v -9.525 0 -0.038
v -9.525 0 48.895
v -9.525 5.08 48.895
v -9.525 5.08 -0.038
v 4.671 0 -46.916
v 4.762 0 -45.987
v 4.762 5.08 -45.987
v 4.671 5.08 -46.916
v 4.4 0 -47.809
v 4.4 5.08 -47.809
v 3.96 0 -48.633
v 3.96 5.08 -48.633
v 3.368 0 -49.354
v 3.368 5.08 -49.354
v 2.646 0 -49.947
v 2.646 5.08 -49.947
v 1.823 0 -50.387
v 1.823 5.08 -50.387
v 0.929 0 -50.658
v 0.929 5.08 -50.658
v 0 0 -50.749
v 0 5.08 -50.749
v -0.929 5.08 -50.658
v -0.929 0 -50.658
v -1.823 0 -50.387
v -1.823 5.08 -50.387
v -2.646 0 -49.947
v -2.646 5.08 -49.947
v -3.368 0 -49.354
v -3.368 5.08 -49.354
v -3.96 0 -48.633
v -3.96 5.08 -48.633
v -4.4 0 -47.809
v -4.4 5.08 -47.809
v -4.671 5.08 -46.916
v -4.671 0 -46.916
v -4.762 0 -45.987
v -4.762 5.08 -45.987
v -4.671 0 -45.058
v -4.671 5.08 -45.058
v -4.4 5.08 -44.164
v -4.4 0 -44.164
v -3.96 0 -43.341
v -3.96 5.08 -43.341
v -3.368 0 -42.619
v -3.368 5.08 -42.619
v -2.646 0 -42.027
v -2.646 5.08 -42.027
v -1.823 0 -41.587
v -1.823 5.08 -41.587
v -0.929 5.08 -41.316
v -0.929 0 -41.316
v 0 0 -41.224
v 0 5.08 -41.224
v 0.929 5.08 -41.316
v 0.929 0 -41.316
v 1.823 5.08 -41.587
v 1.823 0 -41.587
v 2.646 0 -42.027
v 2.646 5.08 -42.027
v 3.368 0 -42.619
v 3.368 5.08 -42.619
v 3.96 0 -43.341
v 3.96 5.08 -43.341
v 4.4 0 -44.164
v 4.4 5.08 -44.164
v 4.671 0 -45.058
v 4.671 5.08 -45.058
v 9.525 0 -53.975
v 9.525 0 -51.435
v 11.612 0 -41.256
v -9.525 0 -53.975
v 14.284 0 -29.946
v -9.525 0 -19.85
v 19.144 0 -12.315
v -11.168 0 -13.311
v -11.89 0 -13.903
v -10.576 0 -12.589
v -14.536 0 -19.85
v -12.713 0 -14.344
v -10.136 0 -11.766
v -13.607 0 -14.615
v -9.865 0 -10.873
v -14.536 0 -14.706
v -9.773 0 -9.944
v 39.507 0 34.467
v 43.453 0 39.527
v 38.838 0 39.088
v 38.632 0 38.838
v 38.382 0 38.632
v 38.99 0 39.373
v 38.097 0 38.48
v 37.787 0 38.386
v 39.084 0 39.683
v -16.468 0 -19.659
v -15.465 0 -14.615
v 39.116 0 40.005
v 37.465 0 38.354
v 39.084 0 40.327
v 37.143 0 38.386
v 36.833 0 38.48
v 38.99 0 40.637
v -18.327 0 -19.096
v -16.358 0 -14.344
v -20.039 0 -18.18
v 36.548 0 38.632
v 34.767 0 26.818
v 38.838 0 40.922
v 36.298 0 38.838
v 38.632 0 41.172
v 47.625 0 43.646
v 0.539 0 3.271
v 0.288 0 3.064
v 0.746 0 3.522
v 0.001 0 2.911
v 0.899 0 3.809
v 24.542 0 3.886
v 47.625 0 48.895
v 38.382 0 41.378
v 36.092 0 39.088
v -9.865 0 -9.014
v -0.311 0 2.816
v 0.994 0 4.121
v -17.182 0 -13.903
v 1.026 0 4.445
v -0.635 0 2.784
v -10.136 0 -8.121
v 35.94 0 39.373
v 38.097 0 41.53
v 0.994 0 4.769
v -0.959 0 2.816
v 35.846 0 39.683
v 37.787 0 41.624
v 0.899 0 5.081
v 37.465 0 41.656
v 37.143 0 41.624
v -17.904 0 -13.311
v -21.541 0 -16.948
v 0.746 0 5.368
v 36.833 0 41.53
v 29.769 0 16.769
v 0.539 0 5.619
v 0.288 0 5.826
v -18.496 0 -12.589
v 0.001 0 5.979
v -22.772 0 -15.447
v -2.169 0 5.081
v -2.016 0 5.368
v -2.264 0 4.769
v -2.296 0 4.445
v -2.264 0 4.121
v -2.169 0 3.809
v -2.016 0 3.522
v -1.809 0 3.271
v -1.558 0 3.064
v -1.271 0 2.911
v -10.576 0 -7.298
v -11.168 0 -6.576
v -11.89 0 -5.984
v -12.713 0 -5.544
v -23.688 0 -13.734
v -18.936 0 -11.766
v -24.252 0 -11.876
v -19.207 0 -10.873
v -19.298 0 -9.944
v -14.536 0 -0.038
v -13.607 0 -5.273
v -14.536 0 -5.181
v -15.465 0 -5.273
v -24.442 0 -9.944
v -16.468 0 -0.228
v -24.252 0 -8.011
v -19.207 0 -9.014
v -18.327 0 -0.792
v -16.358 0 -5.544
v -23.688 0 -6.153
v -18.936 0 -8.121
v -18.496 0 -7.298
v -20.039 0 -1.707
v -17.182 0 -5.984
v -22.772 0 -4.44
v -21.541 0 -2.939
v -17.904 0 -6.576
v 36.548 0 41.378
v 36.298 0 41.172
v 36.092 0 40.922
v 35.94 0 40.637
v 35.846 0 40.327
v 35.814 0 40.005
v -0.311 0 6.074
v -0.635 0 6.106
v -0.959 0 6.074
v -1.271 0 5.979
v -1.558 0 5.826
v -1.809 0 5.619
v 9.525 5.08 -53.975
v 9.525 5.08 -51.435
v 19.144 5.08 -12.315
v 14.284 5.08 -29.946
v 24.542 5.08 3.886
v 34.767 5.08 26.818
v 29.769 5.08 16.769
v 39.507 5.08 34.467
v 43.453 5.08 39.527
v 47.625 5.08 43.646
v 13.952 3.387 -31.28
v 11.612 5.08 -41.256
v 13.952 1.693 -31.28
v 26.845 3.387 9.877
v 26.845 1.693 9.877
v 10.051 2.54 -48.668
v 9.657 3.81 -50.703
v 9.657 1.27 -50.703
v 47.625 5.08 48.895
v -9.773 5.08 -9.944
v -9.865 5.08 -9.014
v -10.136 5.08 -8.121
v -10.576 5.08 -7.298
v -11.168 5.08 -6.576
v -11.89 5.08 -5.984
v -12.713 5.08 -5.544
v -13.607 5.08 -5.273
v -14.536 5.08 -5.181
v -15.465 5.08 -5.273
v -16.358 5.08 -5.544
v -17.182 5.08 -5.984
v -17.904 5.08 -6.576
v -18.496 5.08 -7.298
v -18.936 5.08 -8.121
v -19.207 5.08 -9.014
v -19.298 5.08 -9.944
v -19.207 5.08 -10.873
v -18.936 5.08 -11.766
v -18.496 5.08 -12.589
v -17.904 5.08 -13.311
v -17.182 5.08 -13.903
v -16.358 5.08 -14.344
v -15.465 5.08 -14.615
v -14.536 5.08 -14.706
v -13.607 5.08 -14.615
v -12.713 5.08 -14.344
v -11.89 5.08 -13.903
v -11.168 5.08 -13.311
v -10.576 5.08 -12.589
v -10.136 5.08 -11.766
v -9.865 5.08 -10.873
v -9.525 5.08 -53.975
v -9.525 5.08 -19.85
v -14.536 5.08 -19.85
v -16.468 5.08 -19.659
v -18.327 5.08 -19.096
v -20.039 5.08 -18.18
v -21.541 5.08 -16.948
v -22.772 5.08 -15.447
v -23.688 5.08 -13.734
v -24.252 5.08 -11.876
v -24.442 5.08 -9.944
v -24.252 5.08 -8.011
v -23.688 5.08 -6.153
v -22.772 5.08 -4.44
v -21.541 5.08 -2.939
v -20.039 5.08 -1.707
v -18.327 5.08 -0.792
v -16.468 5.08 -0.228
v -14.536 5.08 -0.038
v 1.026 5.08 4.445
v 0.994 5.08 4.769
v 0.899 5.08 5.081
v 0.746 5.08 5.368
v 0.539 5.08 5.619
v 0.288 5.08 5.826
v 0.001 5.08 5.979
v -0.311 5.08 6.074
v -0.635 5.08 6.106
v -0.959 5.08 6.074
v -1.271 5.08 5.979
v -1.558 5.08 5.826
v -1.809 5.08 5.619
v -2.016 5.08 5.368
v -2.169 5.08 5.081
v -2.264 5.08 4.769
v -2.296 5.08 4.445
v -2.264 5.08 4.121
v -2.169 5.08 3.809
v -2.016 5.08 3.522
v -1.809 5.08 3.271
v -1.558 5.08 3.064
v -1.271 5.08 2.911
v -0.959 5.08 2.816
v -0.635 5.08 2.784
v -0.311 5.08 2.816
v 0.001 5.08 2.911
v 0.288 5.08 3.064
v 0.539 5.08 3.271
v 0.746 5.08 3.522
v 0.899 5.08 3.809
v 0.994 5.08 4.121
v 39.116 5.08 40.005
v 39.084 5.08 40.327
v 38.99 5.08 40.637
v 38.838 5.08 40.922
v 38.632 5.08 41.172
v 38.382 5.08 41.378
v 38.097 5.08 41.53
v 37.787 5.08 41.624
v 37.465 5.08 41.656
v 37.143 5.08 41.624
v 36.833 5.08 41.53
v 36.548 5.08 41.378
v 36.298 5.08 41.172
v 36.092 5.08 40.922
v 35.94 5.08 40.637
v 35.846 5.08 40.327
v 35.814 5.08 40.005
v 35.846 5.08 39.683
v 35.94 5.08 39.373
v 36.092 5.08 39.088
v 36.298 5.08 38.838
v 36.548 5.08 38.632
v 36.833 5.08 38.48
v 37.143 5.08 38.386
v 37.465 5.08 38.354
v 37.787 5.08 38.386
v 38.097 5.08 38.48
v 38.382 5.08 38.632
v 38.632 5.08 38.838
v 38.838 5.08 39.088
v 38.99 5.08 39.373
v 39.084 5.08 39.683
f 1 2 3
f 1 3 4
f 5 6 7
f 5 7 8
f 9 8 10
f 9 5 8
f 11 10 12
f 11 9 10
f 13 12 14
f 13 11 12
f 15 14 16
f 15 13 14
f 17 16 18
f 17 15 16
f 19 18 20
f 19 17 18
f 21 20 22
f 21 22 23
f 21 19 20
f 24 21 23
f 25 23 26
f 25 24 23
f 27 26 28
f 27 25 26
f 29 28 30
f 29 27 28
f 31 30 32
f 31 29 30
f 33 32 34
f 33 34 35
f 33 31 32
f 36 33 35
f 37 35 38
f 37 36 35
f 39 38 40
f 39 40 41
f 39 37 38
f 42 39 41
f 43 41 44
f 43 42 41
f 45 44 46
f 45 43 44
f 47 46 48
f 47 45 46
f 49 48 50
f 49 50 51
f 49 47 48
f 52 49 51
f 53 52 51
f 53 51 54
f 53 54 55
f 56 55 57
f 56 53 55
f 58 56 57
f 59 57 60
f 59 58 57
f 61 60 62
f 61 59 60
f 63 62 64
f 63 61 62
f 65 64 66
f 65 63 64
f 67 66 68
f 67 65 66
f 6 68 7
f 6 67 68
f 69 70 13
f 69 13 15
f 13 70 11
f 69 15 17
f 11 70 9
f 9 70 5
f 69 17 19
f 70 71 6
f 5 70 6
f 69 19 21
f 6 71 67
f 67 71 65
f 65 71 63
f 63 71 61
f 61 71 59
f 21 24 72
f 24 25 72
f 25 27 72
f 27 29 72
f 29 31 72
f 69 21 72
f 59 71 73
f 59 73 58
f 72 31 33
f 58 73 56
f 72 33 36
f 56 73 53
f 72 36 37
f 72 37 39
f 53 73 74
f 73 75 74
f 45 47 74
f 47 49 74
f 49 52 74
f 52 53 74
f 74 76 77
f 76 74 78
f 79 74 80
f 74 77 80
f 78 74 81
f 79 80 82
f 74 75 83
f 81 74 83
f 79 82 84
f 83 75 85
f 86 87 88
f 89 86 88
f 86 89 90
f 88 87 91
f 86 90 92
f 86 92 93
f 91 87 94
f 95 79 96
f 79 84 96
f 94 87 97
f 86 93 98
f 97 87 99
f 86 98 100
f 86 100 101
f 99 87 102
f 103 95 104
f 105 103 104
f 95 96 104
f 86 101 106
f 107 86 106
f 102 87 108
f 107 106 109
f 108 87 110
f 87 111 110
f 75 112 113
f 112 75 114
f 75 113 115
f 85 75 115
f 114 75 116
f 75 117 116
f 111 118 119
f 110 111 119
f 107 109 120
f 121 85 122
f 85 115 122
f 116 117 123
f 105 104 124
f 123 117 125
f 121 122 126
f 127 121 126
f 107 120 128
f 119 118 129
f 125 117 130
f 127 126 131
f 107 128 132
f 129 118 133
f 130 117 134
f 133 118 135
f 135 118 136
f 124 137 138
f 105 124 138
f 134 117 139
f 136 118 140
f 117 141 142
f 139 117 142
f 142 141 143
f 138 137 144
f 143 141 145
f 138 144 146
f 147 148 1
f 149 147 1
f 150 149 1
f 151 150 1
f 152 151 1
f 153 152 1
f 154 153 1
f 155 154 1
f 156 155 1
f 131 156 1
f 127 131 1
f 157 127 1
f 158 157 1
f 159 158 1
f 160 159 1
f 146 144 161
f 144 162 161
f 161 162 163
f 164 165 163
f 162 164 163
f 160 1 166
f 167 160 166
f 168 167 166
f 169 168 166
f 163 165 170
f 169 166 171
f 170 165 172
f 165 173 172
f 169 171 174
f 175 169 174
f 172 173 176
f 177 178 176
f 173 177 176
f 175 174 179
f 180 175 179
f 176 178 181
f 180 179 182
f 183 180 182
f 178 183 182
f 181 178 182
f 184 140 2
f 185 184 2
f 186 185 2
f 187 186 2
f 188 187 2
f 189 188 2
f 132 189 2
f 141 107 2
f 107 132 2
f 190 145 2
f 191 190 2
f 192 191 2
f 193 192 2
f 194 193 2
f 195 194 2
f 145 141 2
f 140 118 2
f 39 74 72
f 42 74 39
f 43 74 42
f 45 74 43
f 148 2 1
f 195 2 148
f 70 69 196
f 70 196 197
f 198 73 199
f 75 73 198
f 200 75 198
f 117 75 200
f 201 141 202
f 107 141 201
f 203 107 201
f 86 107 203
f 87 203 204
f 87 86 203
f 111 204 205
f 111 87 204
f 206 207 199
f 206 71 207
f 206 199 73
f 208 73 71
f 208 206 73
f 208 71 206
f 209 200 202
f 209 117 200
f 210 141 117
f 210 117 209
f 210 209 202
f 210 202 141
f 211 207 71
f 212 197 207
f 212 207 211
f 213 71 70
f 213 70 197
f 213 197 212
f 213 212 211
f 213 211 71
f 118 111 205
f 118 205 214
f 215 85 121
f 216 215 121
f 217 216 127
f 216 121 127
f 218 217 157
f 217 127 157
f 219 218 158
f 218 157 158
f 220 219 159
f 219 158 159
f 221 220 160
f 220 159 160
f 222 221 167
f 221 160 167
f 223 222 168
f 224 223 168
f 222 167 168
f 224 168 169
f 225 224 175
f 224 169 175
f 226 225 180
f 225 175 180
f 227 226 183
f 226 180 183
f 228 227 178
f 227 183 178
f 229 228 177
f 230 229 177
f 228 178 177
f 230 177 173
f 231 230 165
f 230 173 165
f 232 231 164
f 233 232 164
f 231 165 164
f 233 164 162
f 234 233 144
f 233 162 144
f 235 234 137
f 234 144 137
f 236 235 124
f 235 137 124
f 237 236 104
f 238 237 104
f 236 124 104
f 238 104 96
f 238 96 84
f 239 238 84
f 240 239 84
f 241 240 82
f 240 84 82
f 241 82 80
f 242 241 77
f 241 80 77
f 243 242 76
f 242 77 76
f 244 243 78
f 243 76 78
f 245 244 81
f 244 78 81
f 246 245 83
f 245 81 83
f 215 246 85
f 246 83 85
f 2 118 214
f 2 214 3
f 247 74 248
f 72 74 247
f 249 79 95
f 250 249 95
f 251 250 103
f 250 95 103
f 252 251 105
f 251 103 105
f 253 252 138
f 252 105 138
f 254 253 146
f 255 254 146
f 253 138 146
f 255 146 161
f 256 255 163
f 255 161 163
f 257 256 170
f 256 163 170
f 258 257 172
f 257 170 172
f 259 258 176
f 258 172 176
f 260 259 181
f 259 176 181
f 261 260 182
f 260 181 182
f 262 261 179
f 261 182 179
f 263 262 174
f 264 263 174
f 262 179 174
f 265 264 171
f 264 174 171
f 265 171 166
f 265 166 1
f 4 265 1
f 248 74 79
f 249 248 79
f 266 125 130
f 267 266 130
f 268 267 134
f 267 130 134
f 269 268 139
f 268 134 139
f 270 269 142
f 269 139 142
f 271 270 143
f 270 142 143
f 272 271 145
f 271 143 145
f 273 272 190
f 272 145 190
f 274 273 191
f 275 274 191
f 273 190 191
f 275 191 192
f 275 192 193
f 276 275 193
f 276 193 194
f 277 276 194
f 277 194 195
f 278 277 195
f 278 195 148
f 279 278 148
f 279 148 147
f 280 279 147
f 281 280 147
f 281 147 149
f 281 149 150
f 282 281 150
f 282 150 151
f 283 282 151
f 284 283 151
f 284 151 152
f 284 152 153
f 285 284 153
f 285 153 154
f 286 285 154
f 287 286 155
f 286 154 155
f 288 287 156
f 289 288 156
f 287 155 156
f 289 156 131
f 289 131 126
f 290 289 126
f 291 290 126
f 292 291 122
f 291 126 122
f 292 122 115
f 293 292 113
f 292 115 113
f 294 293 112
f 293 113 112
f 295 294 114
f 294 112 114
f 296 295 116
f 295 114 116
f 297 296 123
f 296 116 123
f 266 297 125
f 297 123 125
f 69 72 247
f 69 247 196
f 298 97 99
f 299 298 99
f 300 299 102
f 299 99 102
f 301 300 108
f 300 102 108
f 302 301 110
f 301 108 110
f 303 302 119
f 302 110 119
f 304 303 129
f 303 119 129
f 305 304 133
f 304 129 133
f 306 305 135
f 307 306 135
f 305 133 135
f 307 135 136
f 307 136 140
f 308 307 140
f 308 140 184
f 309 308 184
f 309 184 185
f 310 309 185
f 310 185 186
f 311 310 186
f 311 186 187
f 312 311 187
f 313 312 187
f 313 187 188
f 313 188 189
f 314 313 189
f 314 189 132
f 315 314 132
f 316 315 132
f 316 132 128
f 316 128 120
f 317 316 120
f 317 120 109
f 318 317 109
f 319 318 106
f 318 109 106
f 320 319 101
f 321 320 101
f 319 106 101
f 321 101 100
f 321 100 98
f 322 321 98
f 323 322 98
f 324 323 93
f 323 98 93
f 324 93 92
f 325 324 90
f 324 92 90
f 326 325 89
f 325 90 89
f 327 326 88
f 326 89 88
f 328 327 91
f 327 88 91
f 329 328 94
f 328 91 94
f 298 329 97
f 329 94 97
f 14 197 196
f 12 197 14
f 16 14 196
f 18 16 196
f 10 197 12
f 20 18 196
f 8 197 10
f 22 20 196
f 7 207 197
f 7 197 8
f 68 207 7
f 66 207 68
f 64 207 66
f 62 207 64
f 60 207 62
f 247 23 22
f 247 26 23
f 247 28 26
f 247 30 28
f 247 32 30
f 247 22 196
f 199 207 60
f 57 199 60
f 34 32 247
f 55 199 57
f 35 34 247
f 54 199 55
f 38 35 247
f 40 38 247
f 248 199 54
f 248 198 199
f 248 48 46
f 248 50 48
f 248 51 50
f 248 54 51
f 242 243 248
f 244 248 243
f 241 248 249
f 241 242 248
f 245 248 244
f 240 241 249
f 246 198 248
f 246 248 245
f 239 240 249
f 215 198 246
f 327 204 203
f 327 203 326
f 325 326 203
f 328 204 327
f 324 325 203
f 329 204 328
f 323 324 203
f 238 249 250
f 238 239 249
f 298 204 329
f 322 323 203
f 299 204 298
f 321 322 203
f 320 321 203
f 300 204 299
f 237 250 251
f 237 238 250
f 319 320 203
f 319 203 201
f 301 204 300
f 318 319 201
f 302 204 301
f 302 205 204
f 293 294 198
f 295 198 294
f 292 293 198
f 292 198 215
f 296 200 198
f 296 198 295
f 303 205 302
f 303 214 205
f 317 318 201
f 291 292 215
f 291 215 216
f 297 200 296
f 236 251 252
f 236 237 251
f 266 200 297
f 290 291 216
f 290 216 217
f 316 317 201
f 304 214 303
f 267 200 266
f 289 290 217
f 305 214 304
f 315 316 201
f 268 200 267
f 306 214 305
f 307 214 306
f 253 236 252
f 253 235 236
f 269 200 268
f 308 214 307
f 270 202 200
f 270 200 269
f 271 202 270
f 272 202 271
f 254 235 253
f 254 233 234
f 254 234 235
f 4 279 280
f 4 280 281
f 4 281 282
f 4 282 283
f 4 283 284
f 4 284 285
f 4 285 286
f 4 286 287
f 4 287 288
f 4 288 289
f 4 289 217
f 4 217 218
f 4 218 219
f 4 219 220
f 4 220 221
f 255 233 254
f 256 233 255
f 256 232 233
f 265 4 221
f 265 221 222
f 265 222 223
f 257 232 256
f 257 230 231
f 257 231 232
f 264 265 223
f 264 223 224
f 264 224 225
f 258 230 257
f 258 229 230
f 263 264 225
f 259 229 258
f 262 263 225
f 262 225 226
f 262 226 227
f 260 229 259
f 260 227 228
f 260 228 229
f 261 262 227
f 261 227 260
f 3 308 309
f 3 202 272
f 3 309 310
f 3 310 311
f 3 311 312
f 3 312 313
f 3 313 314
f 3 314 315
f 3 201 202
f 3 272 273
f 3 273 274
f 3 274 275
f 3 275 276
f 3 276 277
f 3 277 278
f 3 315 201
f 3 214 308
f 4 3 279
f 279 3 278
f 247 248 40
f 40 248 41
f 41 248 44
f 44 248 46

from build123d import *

# Parameters (mm, degrees)
SKETCH1_R               = 4.7625
BOSS_EXTRUDE1_DEPTH     = 5.08
SKETCH4_W               = 19.05
SKETCH4_H               = 5.08
BOSS_EXTRUDE2_DEPTH     = 5.08
SKETCH5_R               = 1.660728382
SKETCH5_R_2             = 1.651
CUT_EXTRUDE1_DEPTH      = 1.0000001
CUT_EXTRUDE1_DEPTH_BACK = 6.0800001
SKETCH6_R               = 4.7625
BOSS_EXTRUDE3_DEPTH     = 5.08
CUT_EXTRUDE2_DEPTH      = 1.0000001
CUT_EXTRUDE2_DEPTH_BACK = 6.0800001


with BuildPart() as part:
    # Sketch1 → Boss-Extrude1 (new body)
    with BuildSketch(Plane(origin=(0, 0, 0), x_dir=(1, 0, 0), z_dir=(0, 1, 0))):
        with BuildLine():
            Line((-9.525, 53.975), (9.525, 53.975))
            Line((9.525, 53.975), (9.525, 51.435))
            add(Edge.make_bspline(
                [(9.525, 51.435), (9.525, 51.21454564), (27.819109584, -48.895), (60.325, -48.895)],
                knots=[0, 0, 0, 0, 1, 1, 1, 1], degree=3))
            Line((60.325, -48.895), (-9.525, -48.895))
            Line((-9.525, -48.895), (-9.525, 53.975))
        make_face()
        with Locations((0, 45.9867)):
            Circle(SKETCH1_R, mode=Mode.SUBTRACT)
    extrude(amount=BOSS_EXTRUDE1_DEPTH)

    # Sketch4 → Boss-Extrude2 (add)
    with BuildSketch(Plane(origin=(0, 5.08, 0), x_dir=(1, 0, 0), z_dir=(0, 1, 0))):
        with Locations((50.8, -51.435)):
            Rectangle(SKETCH4_W, SKETCH4_H)
    extrude(amount=-BOSS_EXTRUDE2_DEPTH)

    # Sketch5 → Cut-Extrude1 (cut, two sides)
    with BuildSketch(Plane.XZ) as cut_extrude1_sk:
        with Locations((-0.635, 4.445)):
            Circle(SKETCH5_R)
        with Locations((37.465, 40.005)):
            Circle(SKETCH5_R_2)
    extrude(amount=CUT_EXTRUDE1_DEPTH, mode=Mode.SUBTRACT)
    extrude(cut_extrude1_sk.sketch, amount=-CUT_EXTRUDE1_DEPTH_BACK, mode=Mode.SUBTRACT)

    # Sketch6 → Boss-Extrude3 (add)
    with BuildSketch(Plane.XZ):
        with BuildLine():
            Line((-14.535912, -0.037592), (-9.525, -0.037592))
            Line((-9.525, -0.037592), (-9.525, -1.398441508))
            ThreePointArc((-9.525, -1.398441508), (-4.629912, -9.943592), (-9.525, -18.488742492))
            Line((-9.525, -18.488742492), (-9.525, -19.849592))
            Line((-9.525, -19.849592), (-14.535912, -19.849592))
            ThreePointArc((-14.535912, -19.849592), (-24.441912, -9.943592), (-14.535912, -0.037592))
        make_face()
        with Locations((-14.535912, -9.943592)):
            Circle(SKETCH6_R, mode=Mode.SUBTRACT)
    extrude(amount=-BOSS_EXTRUDE3_DEPTH)

    # Sketch9 → Cut-Extrude2 (cut, two sides)
    with BuildSketch(Plane.XZ) as cut_extrude2_sk:
        with BuildLine():
            Line((60.325, 53.975), (60.325, 48.895))
            add(Edge.make_bspline(
                [(60.325, 48.895), (55.814379896, 48.895), (51.577410685, 46.967369191), (47.625, 43.646486826)],
                knots=[0, 0, 0, 0, 0.138763161, 0.138763161, 0.138763161, 0.138763161], degree=3))
            Line((47.625, 43.646486826), (47.625, 48.895))
            Line((47.625, 48.895), (41.275, 48.895))
            Line((41.275, 48.895), (41.275, 53.975))
            Line((41.275, 53.975), (60.325, 53.975))
        make_face()
    extrude(amount=CUT_EXTRUDE2_DEPTH, mode=Mode.SUBTRACT)
    extrude(cut_extrude2_sk.sketch, amount=-CUT_EXTRUDE2_DEPTH_BACK, mode=Mode.SUBTRACT)


solid = part.part
